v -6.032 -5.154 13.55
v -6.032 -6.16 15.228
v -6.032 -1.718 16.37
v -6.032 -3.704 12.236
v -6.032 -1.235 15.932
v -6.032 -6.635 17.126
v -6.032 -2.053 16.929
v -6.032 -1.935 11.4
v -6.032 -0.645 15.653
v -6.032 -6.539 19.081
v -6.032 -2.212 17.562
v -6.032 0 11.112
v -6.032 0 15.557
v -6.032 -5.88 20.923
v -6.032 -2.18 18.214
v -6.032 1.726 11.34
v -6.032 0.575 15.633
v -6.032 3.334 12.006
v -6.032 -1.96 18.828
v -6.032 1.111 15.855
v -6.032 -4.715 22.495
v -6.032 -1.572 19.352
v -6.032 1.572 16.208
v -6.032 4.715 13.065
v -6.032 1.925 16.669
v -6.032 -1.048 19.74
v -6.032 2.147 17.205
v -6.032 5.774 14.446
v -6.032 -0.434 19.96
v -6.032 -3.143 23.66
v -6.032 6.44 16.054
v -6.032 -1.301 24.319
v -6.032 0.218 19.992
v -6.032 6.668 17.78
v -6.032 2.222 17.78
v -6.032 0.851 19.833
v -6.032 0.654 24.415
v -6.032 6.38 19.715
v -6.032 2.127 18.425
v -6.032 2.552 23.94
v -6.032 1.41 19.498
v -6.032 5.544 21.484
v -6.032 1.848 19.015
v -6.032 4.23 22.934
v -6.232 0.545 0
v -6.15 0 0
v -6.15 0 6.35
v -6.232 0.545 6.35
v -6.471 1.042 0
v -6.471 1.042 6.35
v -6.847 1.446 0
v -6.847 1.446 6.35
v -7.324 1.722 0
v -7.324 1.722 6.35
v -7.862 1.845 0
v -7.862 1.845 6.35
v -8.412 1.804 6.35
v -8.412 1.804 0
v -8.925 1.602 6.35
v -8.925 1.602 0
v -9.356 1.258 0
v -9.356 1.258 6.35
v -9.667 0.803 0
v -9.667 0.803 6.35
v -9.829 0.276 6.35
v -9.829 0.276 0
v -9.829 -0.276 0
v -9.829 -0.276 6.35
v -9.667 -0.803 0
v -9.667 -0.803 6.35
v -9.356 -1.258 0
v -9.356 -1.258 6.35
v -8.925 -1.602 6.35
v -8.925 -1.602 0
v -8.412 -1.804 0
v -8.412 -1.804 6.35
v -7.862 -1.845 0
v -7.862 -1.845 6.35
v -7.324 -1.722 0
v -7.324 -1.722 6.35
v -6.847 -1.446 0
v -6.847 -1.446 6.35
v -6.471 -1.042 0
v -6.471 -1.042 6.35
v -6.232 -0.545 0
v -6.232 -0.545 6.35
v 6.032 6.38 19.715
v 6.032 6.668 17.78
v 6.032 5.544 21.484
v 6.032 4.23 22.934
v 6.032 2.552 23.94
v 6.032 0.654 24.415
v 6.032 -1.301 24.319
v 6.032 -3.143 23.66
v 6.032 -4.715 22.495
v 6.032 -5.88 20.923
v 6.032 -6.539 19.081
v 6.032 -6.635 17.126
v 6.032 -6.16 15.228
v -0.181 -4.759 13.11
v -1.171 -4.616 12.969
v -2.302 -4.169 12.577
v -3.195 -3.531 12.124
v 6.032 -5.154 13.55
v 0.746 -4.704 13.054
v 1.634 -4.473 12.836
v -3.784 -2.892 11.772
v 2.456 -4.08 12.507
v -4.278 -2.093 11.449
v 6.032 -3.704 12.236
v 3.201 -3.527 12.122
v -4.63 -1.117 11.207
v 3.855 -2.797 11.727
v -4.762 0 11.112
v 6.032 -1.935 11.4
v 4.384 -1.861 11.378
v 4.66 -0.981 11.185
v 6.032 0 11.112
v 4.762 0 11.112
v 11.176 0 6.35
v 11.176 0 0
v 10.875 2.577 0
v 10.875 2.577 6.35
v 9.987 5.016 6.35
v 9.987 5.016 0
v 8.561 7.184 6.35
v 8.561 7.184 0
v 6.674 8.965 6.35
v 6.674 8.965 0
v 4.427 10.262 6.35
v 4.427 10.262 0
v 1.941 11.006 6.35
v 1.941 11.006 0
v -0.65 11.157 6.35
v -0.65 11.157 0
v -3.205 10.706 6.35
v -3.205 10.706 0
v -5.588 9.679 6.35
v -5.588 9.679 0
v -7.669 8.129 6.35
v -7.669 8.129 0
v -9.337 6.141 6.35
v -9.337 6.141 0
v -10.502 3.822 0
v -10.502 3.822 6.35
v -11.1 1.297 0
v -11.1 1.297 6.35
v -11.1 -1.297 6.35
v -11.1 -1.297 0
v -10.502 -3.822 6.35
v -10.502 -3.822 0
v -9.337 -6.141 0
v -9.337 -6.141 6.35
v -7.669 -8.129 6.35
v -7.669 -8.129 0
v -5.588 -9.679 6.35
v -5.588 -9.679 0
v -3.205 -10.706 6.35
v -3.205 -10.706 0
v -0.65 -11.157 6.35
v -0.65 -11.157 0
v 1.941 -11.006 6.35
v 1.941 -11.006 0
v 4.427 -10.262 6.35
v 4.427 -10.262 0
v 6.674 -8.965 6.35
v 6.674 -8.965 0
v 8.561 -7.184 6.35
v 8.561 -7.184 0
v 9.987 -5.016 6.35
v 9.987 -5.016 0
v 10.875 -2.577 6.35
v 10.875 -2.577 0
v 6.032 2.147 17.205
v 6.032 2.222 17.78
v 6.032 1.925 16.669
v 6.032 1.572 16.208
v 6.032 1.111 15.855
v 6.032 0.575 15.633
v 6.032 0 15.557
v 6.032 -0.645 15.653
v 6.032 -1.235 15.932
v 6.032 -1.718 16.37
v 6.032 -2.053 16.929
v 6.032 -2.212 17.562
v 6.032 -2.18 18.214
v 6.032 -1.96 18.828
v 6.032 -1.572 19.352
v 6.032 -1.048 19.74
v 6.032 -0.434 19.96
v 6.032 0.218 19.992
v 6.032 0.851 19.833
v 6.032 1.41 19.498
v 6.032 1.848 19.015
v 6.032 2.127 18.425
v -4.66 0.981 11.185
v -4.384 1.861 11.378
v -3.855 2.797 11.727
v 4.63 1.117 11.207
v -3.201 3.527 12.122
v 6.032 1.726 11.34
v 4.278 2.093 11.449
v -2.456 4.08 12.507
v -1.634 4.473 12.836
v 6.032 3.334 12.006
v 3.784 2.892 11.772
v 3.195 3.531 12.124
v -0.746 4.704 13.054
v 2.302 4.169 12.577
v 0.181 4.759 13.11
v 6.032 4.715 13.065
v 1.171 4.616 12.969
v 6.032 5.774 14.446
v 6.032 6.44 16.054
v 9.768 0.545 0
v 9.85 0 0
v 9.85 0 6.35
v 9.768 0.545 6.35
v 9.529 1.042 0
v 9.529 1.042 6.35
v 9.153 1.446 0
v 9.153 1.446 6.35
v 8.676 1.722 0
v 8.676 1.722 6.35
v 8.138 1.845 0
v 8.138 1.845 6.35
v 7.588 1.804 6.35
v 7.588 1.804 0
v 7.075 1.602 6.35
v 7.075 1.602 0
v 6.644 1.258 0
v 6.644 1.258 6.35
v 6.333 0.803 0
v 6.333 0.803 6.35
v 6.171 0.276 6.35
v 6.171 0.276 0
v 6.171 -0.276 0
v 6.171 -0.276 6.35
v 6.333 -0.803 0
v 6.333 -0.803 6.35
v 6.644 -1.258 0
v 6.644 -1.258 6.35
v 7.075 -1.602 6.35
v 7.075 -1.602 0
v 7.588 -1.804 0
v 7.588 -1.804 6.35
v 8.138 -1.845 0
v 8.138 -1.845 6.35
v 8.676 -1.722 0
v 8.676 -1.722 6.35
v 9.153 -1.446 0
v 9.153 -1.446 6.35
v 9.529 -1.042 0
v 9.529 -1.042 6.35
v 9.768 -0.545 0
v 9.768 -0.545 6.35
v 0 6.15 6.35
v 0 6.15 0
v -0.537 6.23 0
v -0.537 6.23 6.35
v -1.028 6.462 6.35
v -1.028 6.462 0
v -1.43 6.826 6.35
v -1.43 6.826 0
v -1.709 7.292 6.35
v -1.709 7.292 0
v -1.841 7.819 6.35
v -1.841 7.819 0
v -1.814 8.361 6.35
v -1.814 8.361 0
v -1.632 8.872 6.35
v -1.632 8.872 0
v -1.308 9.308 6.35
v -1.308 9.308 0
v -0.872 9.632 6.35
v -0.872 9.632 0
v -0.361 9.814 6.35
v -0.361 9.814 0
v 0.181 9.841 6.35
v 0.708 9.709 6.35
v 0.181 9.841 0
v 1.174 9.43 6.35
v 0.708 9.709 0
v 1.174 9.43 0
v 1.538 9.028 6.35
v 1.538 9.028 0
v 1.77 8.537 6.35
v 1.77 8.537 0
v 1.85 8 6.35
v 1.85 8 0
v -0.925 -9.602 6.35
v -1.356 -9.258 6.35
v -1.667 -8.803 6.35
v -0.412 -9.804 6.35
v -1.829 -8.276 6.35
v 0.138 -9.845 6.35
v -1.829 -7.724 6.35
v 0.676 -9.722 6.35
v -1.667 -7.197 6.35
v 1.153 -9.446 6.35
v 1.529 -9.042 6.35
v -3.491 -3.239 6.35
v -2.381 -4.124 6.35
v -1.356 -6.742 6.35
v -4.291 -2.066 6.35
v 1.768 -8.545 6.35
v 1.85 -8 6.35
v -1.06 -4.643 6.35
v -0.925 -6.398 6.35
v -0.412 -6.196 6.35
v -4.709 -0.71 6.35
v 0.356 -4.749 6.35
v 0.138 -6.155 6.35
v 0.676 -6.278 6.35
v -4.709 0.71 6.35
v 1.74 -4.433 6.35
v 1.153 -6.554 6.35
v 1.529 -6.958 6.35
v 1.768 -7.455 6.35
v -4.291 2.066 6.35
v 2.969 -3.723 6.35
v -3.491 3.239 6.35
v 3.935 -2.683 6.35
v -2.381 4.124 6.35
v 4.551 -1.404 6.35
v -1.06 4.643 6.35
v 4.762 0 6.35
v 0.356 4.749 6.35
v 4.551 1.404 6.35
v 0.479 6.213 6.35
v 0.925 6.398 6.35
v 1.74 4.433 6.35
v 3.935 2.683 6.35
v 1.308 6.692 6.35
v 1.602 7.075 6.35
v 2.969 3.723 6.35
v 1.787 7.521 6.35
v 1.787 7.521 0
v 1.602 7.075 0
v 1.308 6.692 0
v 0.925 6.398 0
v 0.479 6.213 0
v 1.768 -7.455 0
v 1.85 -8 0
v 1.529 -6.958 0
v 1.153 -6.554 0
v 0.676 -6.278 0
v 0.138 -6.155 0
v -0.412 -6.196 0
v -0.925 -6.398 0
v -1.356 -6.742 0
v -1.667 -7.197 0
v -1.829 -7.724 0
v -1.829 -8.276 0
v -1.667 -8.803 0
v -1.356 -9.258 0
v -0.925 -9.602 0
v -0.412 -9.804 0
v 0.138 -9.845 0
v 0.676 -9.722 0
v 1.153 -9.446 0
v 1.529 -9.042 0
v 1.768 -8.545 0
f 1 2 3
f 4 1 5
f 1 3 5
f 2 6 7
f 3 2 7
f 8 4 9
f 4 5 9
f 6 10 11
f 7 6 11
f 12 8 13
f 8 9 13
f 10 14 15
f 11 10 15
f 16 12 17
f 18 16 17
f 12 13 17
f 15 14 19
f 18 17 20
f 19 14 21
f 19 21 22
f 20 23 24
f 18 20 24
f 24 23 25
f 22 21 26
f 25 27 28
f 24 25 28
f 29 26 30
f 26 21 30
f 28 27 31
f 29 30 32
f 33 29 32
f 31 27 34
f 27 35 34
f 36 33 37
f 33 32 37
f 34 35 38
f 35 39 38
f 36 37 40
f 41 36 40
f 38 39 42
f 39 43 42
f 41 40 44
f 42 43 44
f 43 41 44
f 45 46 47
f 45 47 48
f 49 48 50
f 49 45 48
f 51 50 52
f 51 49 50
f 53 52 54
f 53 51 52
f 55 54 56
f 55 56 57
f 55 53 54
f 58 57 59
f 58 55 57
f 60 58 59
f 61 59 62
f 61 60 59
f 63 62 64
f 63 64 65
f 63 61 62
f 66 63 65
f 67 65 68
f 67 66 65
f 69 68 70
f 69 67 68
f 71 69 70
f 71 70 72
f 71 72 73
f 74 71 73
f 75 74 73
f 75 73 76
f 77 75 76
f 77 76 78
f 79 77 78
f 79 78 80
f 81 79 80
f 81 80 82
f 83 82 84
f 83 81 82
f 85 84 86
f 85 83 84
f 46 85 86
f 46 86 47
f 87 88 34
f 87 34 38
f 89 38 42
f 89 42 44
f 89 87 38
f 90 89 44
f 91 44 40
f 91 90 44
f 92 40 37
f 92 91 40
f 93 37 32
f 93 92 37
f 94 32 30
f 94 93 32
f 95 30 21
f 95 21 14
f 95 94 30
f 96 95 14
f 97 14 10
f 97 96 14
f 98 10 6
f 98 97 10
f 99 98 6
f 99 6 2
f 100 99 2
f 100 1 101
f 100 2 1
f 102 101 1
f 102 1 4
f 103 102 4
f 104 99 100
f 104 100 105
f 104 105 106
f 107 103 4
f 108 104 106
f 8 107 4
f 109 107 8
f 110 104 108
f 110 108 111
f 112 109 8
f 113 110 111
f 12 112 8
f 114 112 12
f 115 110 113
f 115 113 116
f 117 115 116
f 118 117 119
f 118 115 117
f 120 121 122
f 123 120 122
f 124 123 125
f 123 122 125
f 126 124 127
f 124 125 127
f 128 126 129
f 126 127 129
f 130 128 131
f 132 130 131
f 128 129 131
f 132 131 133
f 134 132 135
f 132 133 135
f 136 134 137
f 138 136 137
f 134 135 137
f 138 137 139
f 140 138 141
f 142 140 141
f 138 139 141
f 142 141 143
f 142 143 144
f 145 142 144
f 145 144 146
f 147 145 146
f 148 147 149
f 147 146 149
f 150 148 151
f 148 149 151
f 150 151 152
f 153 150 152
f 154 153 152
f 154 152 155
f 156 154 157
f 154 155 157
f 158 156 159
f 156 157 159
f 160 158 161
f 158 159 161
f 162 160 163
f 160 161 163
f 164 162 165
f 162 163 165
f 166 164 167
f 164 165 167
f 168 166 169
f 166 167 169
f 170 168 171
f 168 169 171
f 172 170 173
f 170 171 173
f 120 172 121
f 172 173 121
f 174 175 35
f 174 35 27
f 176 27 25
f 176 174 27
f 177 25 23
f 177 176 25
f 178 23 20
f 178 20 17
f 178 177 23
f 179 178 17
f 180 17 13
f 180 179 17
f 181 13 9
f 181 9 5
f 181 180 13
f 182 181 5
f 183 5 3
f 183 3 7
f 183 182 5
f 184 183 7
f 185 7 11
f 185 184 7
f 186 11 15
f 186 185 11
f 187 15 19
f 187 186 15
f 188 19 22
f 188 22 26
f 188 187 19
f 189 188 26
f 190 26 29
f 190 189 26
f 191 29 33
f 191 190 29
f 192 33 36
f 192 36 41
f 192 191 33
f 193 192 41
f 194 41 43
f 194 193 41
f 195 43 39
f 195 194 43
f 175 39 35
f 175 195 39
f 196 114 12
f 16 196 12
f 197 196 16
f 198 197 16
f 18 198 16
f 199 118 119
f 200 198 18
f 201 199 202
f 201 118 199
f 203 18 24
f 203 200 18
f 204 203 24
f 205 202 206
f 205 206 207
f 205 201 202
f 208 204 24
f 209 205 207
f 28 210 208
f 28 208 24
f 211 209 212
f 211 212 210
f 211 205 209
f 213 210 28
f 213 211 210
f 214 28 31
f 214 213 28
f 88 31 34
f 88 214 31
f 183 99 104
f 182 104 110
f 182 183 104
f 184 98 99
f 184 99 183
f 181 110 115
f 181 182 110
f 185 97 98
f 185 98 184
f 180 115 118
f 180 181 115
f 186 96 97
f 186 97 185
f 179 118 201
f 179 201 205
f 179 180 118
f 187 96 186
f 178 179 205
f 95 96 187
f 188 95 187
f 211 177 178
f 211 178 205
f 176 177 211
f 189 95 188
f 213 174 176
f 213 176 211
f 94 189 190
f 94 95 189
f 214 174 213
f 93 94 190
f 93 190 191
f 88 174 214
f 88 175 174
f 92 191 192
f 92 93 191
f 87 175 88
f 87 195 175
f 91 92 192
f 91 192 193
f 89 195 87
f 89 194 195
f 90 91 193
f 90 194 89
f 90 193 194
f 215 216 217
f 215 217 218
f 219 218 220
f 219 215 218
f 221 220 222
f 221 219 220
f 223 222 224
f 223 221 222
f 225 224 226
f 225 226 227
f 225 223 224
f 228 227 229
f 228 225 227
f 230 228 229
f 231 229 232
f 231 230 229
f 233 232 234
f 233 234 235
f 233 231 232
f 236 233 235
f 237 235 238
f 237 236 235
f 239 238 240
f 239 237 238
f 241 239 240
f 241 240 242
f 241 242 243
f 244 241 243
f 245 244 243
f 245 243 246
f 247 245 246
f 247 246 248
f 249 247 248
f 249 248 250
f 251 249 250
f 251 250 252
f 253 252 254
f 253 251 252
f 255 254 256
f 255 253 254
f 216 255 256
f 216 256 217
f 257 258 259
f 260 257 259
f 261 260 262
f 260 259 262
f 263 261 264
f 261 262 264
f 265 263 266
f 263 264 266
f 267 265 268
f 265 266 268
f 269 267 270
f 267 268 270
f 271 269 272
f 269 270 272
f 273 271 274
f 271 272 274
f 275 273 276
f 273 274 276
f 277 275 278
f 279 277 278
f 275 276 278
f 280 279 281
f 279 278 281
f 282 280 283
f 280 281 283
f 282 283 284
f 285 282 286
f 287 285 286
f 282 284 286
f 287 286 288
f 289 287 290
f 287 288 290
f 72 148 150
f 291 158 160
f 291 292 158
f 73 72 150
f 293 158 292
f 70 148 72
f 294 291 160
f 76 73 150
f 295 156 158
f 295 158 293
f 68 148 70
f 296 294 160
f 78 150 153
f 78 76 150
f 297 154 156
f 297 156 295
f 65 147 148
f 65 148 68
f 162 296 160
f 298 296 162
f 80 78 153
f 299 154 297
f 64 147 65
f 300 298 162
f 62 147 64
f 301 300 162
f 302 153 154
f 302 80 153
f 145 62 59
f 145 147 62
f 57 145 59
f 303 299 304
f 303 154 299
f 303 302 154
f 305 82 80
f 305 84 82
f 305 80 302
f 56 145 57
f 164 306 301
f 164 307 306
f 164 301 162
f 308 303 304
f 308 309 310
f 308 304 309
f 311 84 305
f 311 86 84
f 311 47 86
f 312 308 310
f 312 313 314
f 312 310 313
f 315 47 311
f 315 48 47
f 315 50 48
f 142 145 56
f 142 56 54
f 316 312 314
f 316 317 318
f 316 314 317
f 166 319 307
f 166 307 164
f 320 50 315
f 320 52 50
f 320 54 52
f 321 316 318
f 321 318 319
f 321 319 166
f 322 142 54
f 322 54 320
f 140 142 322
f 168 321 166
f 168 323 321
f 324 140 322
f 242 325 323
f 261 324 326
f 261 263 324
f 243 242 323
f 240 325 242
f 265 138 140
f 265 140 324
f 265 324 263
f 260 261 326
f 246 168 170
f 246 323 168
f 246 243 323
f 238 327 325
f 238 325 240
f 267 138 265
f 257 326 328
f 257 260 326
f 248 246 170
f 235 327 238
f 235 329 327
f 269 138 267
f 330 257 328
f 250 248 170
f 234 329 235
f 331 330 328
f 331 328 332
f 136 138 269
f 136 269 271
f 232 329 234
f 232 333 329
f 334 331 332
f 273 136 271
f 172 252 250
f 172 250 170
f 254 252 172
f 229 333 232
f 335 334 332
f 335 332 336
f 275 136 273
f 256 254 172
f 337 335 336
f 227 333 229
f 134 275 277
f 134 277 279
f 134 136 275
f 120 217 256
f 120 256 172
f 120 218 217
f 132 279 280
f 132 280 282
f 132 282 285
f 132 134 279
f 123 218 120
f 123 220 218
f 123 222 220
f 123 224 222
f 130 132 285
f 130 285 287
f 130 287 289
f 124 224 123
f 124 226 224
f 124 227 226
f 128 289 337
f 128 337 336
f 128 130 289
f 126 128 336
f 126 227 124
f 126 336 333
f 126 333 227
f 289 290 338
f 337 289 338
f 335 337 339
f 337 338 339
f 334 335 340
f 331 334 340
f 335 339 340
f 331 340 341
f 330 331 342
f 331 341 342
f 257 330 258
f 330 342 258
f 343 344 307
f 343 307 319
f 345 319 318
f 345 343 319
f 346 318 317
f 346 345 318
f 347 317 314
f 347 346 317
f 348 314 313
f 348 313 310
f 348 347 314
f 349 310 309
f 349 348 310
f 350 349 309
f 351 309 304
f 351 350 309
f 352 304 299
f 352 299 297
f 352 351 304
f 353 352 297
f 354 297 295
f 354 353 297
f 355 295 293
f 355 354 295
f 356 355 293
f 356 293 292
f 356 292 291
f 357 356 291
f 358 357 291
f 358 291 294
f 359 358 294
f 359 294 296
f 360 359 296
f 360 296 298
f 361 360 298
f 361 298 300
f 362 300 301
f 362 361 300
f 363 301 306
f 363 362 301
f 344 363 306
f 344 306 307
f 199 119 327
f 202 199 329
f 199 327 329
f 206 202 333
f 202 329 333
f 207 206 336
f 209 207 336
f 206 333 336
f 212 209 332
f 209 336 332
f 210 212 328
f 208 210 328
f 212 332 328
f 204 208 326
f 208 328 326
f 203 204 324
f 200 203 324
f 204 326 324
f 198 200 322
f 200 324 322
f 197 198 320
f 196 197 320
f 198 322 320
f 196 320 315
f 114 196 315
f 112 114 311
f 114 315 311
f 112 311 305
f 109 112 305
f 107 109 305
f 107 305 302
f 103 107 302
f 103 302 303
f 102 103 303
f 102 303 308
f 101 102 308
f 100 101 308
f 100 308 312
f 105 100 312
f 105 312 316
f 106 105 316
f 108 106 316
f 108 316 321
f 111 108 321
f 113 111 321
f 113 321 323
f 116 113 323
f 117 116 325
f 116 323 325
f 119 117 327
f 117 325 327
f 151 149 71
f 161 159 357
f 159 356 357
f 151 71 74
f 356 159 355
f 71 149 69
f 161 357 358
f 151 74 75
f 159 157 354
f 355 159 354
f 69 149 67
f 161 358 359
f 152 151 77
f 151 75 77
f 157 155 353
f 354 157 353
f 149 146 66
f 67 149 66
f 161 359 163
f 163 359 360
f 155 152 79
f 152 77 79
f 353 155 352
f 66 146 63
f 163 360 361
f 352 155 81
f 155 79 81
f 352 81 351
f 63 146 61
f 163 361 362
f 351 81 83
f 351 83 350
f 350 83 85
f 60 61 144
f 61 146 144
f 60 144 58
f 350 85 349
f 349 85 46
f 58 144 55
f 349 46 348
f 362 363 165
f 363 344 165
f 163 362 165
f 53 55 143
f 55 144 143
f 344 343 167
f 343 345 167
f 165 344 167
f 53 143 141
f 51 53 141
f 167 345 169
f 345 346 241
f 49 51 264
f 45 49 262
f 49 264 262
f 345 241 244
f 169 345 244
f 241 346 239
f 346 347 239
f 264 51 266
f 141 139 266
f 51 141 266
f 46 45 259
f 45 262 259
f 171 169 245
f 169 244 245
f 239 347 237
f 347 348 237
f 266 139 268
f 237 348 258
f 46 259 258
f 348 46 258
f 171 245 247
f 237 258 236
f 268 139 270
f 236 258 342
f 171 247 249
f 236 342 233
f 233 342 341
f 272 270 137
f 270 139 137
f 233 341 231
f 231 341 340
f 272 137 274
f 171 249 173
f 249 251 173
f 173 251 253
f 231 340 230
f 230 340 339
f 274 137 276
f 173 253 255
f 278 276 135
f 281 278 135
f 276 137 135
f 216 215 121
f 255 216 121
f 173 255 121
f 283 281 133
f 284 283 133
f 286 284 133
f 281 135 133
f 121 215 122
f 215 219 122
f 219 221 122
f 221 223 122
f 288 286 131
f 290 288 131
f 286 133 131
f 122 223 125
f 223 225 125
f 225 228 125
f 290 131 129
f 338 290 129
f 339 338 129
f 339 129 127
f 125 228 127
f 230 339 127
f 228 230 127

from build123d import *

# Parameters (mm, degrees)
F0_R     = 11.176
F0_R_2   = 1.85
F1_DEPTH = 6.35
F2_R     = 4.7625
F3_DEPTH = 8.255
F5_DEPTH = 6.0325


with BuildPart() as f1:
    # F0 (on Top) → F1 (new body)
    with BuildSketch(Plane.XY):
        Circle(F0_R)
        with Locations((0, -8)):
            Circle(F0_R_2, mode=Mode.SUBTRACT)
        with Locations((-8, 0)):
            Circle(F0_R_2, mode=Mode.SUBTRACT)
        with Locations((8, 0)):
            Circle(F0_R_2, mode=Mode.SUBTRACT)
        with BuildLine():
            ThreePointArc((0, 6.15), (-1.308148, 9.308148), (1.85, 8))
            ThreePointArc((1.85, 8), (1.308148, 6.691852), (0, 6.15))
        make_face(mode=Mode.SUBTRACT)
    extrude(amount=F1_DEPTH)

    # F2 (on face) → F3 (join)
    with BuildSketch(Plane.XY.offset(6.35)):
        Circle(F2_R)
    extrude(amount=F3_DEPTH)

    # F4 (on Right) → F5 (join, symmetric)
    with BuildSketch(Plane.YZ):
        with BuildLine():
            ThreePointArc((6.6675, 17.78), (-4.714634, 22.494634), (0, 11.1125))
            ThreePointArc((0, 11.1125), (4.714634, 13.065366), (6.6675, 17.78))
        make_face()
        with BuildLine():
            ThreePointArc((2.2225, 17.78), (1.571545, 16.208455), (0, 15.5575))
            ThreePointArc((0, 15.5575), (-1.571545, 19.351545), (2.2225, 17.78))
        make_face(mode=Mode.SUBTRACT)
    extrude(amount=F5_DEPTH, both=True)


solid = f1.part
